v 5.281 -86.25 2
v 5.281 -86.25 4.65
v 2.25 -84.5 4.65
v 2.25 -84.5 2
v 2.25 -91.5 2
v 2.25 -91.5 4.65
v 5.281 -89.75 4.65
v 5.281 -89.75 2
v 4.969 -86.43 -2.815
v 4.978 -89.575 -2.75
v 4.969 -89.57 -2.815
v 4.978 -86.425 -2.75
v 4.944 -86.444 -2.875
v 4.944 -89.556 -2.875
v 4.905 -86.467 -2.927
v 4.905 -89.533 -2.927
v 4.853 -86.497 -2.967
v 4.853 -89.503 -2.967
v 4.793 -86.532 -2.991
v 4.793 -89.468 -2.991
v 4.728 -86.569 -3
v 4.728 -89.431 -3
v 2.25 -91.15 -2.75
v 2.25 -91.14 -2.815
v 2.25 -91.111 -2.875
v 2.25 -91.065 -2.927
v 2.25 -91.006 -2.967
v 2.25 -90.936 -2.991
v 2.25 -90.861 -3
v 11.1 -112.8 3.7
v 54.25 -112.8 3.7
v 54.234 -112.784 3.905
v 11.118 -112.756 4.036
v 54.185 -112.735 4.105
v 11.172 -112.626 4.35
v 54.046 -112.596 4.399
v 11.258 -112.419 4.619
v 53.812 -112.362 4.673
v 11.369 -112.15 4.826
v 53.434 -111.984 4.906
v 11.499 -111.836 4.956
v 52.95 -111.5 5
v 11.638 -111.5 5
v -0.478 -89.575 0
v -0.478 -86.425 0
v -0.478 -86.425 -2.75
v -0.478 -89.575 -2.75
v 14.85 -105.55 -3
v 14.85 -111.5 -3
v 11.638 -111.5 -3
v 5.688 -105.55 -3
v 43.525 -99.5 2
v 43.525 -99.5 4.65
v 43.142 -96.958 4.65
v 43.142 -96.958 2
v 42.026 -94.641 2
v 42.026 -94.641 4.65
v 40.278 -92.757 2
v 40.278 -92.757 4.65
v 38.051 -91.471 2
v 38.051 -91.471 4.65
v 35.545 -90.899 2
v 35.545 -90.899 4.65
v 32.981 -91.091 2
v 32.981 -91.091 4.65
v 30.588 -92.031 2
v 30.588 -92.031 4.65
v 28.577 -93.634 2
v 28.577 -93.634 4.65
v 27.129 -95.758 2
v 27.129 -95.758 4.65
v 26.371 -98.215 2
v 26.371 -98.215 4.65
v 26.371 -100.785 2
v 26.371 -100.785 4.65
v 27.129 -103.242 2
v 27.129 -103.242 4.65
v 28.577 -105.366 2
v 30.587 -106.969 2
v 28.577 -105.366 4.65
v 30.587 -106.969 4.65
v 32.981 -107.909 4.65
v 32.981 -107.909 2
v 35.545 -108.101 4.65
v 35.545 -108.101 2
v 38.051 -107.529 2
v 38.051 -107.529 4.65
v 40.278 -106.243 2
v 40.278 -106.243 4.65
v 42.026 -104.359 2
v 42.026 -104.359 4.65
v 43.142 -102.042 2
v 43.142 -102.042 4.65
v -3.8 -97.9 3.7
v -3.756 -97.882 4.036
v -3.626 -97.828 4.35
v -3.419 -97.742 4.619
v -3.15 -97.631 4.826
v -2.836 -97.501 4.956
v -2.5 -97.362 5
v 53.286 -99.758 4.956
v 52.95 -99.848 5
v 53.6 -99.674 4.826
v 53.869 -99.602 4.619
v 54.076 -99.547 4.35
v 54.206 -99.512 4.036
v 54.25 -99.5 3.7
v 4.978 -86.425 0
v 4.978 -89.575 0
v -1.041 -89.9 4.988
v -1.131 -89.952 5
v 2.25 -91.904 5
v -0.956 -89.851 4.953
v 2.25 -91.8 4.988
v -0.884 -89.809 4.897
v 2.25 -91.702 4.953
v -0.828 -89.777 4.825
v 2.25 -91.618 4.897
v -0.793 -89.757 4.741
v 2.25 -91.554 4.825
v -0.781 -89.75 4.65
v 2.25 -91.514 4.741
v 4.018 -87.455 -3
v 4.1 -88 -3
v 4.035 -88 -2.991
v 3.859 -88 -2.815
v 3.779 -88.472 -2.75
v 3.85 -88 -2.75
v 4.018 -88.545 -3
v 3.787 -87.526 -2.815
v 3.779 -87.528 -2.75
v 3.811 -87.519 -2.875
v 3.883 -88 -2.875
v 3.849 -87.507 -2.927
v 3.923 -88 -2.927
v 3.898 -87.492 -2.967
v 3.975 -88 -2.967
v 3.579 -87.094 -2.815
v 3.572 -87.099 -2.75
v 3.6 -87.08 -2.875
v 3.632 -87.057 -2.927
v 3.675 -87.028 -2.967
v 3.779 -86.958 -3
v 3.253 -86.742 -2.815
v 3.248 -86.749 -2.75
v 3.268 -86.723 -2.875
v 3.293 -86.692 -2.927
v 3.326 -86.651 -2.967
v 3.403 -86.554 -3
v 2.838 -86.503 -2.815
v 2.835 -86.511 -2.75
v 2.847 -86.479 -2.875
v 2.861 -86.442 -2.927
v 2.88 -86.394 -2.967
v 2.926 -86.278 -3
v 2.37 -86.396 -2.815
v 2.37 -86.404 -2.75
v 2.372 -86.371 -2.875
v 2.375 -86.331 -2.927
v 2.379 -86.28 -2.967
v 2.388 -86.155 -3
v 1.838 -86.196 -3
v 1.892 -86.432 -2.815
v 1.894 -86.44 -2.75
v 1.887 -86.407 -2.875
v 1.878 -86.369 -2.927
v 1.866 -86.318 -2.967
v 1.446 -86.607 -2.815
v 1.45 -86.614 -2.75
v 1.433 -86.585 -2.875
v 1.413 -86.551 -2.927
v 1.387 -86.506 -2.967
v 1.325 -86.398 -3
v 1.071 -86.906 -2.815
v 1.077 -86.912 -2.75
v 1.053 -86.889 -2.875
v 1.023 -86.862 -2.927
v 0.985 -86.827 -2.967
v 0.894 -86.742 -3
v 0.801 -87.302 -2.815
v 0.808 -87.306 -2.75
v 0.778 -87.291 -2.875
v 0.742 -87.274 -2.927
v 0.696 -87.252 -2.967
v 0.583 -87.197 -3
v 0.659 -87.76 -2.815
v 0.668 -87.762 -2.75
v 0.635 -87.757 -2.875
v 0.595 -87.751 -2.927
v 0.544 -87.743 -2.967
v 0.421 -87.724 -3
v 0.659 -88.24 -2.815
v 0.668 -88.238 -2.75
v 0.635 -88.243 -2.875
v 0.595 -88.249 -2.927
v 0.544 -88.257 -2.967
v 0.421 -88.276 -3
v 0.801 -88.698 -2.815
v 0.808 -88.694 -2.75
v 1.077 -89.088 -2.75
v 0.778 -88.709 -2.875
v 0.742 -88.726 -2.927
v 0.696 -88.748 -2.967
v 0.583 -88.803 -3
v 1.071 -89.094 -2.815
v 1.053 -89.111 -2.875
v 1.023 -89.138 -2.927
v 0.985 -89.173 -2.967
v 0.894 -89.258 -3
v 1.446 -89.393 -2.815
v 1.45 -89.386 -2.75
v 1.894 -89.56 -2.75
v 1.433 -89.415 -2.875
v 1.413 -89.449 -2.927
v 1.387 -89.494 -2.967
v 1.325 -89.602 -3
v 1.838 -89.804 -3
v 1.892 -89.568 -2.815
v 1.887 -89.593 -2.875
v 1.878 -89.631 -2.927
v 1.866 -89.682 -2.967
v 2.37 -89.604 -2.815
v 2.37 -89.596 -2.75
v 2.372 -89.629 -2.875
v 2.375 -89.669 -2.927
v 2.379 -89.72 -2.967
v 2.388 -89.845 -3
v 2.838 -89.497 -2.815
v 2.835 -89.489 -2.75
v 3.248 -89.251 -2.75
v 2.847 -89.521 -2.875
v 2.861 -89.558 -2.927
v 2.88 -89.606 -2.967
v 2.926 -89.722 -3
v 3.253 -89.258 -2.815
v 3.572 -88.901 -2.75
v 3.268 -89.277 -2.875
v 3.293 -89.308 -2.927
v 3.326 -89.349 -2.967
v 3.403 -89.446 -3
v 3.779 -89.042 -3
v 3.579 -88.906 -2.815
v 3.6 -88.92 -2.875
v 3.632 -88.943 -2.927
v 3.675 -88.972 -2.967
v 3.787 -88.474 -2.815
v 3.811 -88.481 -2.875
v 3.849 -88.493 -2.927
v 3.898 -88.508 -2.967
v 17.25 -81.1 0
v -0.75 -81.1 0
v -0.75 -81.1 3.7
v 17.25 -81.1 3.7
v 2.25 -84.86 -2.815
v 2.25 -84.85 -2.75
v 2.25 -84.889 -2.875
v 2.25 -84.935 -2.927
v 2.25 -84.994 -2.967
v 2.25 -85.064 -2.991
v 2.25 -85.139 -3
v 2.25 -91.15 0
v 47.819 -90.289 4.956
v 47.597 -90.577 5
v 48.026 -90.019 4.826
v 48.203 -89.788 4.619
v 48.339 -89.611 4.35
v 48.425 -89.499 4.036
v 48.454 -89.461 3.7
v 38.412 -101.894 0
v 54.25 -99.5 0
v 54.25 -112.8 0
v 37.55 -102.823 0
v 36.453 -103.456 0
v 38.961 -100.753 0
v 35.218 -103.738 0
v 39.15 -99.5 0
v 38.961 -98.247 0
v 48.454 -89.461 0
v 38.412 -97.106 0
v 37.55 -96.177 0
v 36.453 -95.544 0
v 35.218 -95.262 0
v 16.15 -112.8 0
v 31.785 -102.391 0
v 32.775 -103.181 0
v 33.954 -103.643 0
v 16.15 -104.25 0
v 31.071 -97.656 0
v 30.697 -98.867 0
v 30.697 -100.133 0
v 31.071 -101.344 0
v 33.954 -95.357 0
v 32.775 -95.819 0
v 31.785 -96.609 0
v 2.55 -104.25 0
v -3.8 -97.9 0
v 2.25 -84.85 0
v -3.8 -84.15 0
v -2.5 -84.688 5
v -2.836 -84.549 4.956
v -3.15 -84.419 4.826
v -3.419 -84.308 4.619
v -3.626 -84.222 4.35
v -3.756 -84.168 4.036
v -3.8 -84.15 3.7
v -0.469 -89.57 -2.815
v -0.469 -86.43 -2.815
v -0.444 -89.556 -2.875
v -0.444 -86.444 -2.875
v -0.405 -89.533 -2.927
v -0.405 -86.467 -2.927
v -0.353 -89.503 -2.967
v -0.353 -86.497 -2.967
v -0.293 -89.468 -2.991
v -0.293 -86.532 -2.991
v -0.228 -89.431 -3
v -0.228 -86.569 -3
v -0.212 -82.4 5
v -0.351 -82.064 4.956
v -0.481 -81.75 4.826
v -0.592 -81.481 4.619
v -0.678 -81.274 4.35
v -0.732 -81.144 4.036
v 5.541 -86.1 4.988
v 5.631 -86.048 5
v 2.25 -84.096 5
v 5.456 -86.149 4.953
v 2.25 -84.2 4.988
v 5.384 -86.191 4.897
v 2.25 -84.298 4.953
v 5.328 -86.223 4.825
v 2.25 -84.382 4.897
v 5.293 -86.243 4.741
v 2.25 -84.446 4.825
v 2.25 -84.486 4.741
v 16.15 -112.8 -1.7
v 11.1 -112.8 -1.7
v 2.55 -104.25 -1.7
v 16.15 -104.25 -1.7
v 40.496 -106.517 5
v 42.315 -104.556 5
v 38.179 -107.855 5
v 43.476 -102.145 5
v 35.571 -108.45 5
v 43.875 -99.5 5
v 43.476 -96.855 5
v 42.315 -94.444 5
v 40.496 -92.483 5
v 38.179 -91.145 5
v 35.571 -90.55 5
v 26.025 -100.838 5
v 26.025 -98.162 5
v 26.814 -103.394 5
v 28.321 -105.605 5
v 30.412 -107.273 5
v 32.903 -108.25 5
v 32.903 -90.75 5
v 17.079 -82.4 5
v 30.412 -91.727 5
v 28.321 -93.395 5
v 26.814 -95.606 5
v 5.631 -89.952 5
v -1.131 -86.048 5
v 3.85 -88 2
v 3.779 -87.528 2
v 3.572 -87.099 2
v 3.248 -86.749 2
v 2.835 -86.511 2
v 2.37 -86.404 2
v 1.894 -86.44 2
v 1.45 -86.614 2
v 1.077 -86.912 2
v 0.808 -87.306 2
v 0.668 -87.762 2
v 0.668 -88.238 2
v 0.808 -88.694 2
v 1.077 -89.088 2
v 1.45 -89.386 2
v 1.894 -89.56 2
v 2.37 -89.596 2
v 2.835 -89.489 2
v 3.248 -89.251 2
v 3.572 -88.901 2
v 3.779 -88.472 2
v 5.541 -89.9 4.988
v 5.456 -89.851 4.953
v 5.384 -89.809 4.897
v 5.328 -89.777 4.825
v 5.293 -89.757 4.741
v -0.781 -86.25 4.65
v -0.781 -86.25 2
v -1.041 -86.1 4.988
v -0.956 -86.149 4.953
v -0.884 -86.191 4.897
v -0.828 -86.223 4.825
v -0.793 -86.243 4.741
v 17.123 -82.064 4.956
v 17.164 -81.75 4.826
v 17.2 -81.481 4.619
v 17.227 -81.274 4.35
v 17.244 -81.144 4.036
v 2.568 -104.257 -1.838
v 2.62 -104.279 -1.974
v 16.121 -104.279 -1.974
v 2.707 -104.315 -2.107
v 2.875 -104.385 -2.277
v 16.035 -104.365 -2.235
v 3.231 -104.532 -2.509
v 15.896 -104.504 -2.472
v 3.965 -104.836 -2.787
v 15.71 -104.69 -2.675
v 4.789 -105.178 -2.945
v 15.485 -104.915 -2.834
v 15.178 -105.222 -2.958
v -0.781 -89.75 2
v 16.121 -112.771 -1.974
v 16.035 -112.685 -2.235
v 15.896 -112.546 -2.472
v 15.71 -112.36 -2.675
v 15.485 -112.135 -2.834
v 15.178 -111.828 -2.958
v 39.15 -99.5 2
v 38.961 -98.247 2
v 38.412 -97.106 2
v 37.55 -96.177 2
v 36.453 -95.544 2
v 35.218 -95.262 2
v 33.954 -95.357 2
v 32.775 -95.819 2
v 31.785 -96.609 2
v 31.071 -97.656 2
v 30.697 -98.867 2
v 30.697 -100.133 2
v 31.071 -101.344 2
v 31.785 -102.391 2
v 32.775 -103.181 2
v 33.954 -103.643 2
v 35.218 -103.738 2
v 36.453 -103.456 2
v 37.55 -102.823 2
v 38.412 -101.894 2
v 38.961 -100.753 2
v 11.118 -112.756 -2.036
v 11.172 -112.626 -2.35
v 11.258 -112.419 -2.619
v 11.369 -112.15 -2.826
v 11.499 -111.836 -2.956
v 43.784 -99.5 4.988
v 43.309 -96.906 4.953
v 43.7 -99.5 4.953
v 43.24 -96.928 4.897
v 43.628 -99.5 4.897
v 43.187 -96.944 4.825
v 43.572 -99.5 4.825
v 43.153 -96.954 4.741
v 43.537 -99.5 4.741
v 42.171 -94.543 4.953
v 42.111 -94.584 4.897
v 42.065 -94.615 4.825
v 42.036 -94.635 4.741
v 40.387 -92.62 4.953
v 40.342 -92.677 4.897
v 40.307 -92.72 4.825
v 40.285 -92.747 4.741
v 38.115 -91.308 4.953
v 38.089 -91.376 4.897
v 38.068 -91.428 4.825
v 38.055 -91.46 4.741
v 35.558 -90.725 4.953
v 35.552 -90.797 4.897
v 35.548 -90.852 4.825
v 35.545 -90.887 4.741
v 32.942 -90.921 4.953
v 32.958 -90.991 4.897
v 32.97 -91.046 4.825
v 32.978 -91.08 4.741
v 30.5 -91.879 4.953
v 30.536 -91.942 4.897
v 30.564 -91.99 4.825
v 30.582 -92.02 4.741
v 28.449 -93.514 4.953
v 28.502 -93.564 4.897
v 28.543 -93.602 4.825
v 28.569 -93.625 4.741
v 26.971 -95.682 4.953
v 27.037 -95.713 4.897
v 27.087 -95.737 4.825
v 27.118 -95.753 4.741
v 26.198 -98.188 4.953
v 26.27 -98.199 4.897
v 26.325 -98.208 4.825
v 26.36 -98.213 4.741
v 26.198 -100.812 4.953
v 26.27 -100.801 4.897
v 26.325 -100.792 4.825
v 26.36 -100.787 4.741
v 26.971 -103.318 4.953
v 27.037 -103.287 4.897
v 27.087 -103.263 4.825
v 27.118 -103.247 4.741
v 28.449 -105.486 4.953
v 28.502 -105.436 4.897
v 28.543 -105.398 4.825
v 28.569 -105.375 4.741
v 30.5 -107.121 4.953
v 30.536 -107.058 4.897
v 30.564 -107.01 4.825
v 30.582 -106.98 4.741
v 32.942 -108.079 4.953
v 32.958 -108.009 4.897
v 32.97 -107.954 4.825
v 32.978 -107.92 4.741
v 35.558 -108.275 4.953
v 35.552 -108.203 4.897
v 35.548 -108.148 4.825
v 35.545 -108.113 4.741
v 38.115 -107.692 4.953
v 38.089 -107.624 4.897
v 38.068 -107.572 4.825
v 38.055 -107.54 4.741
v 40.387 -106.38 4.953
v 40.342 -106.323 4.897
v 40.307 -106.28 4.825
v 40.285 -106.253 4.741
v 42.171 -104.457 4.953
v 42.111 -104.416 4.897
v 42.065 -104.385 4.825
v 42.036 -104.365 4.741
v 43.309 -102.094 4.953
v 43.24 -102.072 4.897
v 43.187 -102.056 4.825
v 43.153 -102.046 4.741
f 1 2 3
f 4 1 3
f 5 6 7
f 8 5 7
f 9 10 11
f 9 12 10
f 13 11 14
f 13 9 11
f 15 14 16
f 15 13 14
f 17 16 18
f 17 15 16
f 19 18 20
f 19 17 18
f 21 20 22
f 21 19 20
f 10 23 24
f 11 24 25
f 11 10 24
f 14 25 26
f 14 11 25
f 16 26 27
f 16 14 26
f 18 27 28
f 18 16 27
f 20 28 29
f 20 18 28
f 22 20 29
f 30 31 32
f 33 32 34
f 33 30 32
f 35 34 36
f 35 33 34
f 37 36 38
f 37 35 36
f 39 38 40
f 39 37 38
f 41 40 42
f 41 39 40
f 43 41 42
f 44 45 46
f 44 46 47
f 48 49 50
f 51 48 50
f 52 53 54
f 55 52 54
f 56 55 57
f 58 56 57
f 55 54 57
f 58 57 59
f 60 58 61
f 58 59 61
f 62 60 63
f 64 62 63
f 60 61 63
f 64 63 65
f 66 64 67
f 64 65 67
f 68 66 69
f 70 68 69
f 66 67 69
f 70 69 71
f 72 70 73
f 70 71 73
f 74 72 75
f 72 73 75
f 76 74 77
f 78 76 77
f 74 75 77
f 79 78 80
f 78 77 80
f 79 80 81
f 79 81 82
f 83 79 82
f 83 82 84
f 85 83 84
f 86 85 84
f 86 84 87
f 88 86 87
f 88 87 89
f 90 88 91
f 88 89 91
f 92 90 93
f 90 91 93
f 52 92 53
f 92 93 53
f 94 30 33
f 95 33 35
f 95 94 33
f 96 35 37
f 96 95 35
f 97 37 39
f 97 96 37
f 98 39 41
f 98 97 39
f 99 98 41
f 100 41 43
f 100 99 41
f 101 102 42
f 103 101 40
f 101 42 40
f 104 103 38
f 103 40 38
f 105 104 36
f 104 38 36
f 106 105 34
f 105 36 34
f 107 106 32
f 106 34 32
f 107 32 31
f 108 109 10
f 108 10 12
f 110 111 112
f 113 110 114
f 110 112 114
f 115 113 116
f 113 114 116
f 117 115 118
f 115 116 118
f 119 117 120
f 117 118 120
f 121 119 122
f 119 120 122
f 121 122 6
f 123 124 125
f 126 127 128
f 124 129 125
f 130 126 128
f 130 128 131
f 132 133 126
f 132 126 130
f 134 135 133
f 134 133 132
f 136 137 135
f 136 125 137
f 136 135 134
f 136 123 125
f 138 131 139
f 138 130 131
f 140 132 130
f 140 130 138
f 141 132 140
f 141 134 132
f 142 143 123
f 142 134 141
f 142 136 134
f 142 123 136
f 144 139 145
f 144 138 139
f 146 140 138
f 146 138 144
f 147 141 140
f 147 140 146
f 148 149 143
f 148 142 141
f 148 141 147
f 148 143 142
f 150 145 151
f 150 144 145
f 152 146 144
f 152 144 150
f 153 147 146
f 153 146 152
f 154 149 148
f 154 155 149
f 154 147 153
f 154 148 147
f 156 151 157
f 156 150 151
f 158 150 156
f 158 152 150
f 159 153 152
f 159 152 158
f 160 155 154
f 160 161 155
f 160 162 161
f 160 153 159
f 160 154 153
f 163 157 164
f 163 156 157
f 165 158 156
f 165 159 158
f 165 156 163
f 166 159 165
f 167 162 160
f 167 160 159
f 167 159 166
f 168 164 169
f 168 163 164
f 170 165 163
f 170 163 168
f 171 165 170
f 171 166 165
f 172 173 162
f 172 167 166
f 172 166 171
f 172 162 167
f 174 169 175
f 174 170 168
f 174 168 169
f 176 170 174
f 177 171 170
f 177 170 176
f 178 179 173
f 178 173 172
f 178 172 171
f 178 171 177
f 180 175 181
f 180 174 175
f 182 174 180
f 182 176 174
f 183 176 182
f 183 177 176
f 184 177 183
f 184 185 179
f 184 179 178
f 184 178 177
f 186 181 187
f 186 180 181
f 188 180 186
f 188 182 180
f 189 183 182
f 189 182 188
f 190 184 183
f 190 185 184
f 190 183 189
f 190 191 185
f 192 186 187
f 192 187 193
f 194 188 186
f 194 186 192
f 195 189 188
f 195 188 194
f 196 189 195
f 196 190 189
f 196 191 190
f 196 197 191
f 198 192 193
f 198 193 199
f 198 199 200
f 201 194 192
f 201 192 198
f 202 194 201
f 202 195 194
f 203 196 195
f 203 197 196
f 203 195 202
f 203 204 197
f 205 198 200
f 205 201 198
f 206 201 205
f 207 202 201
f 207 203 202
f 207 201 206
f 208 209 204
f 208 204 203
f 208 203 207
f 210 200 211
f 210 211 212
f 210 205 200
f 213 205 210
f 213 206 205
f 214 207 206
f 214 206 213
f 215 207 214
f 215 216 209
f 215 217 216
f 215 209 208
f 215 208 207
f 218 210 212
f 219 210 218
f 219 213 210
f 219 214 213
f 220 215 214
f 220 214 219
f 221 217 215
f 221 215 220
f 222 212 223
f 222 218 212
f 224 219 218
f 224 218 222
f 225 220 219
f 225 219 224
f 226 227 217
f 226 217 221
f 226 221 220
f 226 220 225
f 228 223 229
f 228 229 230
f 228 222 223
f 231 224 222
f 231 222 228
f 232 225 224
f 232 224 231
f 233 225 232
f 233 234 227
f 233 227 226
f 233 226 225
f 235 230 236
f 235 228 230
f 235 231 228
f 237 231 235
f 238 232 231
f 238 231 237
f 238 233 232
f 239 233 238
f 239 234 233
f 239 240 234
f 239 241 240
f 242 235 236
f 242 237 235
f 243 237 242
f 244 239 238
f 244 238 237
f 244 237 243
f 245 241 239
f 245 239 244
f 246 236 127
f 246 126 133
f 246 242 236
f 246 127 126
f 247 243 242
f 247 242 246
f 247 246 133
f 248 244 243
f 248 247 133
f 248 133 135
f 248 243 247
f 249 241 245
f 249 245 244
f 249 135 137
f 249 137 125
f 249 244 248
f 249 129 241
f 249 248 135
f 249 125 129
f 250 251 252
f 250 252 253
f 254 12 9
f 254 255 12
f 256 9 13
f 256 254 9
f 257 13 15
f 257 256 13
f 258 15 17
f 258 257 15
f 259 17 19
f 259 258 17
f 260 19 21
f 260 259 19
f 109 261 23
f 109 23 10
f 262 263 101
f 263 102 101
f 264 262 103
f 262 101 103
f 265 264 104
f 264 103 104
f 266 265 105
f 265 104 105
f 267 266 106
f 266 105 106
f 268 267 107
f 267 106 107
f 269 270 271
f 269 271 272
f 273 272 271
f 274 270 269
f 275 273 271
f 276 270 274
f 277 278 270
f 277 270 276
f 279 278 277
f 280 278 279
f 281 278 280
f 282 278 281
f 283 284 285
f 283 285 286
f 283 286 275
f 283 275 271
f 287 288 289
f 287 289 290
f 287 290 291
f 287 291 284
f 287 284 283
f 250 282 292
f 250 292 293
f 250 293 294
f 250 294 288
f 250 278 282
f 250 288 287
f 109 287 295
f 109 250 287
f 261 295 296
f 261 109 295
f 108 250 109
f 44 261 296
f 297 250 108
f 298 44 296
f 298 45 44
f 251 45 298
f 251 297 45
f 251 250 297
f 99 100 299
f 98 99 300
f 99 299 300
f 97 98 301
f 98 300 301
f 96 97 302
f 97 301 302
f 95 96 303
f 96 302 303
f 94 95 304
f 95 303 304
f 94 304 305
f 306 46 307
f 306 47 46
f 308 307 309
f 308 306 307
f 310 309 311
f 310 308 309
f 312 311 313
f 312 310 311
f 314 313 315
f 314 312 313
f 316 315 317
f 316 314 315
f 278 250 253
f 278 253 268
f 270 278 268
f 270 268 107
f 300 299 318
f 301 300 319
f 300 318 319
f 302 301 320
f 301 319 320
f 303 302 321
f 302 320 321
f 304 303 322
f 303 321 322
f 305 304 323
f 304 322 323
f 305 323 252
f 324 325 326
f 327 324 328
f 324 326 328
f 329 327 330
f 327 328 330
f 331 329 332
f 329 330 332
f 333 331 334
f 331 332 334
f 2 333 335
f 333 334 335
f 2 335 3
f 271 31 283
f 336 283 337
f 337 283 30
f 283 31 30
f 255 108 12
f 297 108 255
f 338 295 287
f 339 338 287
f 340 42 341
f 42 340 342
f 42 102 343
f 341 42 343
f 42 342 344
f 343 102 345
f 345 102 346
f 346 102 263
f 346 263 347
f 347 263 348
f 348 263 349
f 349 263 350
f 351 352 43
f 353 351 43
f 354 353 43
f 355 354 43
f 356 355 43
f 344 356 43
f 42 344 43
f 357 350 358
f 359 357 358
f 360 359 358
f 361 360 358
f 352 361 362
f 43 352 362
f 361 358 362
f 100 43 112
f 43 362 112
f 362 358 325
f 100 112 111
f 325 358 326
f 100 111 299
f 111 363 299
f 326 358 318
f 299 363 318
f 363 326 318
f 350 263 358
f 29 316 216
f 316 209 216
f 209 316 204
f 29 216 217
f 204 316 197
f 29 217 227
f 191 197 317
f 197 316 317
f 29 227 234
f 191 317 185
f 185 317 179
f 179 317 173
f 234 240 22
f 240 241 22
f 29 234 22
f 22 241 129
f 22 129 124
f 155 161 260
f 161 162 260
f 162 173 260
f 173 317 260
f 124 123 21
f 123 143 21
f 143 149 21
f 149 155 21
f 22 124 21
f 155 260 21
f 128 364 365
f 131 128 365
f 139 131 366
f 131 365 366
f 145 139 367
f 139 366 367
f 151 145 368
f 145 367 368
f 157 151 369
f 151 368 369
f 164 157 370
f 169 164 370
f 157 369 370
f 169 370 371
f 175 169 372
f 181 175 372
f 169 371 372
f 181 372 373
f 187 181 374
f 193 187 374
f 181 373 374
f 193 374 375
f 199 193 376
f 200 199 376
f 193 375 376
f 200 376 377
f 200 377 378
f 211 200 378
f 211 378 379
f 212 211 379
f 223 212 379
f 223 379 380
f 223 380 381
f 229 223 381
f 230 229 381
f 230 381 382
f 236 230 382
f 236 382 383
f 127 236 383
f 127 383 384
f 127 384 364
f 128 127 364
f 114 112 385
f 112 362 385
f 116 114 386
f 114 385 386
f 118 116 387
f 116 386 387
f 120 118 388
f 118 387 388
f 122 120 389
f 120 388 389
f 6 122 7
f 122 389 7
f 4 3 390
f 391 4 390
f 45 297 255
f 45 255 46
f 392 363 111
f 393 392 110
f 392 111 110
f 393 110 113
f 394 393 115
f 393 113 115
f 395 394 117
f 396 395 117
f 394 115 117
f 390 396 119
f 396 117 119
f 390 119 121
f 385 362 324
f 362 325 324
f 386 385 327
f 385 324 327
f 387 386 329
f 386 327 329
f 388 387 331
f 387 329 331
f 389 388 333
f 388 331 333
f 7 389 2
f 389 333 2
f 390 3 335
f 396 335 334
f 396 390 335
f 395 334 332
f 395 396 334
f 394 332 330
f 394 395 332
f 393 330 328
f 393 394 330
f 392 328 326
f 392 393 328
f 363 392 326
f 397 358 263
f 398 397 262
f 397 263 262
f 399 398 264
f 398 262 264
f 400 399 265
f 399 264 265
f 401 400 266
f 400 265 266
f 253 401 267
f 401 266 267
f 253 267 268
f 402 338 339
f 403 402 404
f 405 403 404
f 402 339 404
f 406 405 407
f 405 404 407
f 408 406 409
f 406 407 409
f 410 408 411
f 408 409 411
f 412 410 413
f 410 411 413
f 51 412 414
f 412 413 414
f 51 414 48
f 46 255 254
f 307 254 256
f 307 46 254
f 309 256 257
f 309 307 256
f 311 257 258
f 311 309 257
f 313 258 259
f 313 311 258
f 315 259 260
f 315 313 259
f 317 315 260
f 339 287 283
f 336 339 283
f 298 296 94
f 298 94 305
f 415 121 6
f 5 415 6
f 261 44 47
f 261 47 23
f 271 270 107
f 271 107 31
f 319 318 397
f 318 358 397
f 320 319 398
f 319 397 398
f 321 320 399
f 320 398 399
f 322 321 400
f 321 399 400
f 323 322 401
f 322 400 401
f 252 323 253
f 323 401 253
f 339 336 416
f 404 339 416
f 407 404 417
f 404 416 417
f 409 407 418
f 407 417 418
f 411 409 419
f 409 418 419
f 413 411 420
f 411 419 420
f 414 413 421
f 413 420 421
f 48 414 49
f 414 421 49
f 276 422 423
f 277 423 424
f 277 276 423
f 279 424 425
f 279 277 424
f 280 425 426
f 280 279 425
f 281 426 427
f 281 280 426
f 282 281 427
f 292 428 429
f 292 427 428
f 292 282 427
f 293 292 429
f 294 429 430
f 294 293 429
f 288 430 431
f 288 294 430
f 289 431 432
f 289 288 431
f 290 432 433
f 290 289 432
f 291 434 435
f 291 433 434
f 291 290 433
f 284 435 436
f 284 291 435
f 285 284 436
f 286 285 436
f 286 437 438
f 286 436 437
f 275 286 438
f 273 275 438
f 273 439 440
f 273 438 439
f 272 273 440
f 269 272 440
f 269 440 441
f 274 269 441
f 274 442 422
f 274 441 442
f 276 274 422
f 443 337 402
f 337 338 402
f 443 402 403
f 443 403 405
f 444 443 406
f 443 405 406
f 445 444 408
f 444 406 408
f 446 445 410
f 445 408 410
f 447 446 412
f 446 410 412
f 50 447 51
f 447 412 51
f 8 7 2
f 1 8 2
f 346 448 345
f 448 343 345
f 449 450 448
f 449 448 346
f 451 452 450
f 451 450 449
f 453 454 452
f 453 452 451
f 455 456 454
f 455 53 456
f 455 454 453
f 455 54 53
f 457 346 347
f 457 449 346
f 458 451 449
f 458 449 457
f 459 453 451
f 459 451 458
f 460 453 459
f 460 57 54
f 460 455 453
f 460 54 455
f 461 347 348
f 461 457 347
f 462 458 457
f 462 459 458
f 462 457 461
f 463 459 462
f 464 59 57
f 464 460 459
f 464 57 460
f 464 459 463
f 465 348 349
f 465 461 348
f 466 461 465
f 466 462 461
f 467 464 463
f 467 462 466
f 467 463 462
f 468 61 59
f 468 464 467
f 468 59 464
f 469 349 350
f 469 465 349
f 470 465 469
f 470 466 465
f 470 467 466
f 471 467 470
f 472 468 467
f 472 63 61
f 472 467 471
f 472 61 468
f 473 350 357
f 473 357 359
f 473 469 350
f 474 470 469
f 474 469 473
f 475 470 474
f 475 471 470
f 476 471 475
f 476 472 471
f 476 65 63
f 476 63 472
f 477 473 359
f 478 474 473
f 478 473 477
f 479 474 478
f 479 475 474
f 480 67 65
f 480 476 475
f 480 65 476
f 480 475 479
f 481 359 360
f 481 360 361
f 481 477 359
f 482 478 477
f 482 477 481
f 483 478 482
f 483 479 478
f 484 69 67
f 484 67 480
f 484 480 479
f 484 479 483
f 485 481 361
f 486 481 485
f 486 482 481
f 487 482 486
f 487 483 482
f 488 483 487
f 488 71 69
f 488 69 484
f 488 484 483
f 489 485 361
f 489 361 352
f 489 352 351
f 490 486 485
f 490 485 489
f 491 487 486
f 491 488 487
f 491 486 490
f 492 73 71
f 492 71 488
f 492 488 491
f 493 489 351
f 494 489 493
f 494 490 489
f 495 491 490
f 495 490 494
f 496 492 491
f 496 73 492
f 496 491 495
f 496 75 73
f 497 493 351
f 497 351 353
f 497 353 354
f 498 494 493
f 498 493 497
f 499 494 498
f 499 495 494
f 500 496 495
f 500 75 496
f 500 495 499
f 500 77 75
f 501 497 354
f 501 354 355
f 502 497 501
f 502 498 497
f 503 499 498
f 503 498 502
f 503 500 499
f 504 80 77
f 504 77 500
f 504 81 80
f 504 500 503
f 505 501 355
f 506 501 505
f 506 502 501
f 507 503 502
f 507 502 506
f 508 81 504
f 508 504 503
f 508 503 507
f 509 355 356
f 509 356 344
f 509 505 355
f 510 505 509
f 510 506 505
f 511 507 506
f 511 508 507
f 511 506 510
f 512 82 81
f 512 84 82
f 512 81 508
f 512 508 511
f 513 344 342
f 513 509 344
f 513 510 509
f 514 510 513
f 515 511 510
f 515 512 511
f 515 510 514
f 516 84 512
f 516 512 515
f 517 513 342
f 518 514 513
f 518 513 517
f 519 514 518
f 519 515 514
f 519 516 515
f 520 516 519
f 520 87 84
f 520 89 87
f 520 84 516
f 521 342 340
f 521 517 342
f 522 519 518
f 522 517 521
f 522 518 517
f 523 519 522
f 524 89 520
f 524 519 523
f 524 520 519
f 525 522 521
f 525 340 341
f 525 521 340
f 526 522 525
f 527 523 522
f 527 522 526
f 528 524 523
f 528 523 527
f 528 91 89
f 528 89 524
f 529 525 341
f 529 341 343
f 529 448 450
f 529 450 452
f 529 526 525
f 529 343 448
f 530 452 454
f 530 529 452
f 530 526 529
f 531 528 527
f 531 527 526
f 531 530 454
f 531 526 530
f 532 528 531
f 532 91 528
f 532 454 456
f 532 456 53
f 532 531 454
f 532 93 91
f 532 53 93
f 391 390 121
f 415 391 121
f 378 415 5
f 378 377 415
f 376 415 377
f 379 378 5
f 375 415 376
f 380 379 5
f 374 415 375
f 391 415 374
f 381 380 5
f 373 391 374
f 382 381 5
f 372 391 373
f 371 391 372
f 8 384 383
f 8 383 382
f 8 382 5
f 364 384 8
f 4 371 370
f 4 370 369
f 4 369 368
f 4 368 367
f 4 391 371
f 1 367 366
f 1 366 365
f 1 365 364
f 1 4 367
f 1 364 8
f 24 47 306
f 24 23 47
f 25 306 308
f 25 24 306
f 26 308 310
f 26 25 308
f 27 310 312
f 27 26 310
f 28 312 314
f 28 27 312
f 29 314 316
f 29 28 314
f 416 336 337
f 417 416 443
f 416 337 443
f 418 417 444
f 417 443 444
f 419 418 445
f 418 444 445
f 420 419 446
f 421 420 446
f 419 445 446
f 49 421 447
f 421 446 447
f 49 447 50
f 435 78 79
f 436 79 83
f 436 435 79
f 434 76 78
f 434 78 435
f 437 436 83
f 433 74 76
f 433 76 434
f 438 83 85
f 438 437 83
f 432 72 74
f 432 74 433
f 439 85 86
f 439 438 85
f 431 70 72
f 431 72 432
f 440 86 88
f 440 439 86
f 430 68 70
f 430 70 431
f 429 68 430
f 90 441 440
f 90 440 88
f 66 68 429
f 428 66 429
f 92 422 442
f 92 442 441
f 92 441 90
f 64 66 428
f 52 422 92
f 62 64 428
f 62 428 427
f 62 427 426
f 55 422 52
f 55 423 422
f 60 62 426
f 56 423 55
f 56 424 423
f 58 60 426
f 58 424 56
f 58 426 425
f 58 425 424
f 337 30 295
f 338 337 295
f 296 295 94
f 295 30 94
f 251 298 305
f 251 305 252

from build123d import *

# Parameters (mm, degrees)
SKETCH019_R     = 4.25
PAD010_DEPTH    = 5
PAD009_DEPTH    = 3
SKETCH021_R     = 8.625
POCKET008_DEPTH = 3
POCKET009_DEPTH = 3
SKETCH018_R     = 1.6
POCKET007_DEPTH = 8.001
SKETCH022_R     = 1.6
PAD011_DEPTH    = 3
FILLET020_R     = 0.35
FILLET021_R     = 0.35
FILLET022_R     = 0.25
FILLET023_R     = 1.3
FILLET024_R     = 1.3


with BuildPart() as part:
    # Sketch019 → Pad010 (new body)
    with BuildSketch(Plane.XY):
        Polygon((-3, 6.9), (15, 6.9), (46.204036, -1.461096), (52, -11.5), (52, -24.8), (8.85, -24.8), (-6.05, -9.9), (-6.05, 3.85), align=None)
        with Locations((32.65, -11.5)):
            Circle(SKETCH019_R, mode=Mode.SUBTRACT)
    extrude(amount=PAD010_DEPTH)

    # Sketch020 → Pad009 (join)
    with BuildSketch(Plane.XY):
        Polygon((0.3, -16.25), (13.9, -16.25), (13.9, -24.8), (8.85, -24.8), align=None)
    extrude(amount=-PAD009_DEPTH)

    # Sketch021 → Pocket008 (cut)
    with BuildSketch(Plane.XY.offset(5)):
        with Locations((32.65, -11.5)):
            Circle(SKETCH021_R)
    extrude(amount=-POCKET008_DEPTH, mode=Mode.SUBTRACT)

    # Sketch017 → Pocket009 (cut)
    with BuildSketch(Plane.XY.offset(5)):
        Polygon((0, -3.5), (3.031089, -1.75), (3.031089, 1.75), (0, 3.5), (-3.031089, 1.75), (-3.031089, -1.75), align=None)
    extrude(amount=-POCKET009_DEPTH, mode=Mode.SUBTRACT)

    # Sketch018 → Pocket007 (cut, through all)
    with BuildSketch(Plane.XY.offset(-3)):
        Circle(SKETCH018_R)
    extrude(amount=POCKET007_DEPTH, mode=Mode.SUBTRACT)

    # Sketch022 → Pad011 (join)
    with BuildSketch(Plane.XY):
        Polygon((0, -3.15), (2.72798, -1.575), (2.72798, 1.575), (0, 3.15), (-2.72798, 1.575), (-2.72798, -1.575), align=None)
        Circle(SKETCH022_R, mode=Mode.SUBTRACT)
    extrude(amount=-PAD011_DEPTH)

    # Fillet020
    fillet020_edges = [part.edges().sort_by_distance(p)[0] for p in [
        (-1.515544, -2.625, 5),
        (-3.031089, 0, 5),
        (-1.515544, 2.625, 5),
        (1.515544, 2.625, 5),
        (3.031089, 0, 5),
        (1.515544, -2.625, 5),
    ]]
    fillet(fillet020_edges, radius=FILLET020_R)

    # Fillet021
    fillet021_edges = [part.edges().sort_by_distance(p)[0] for p in [
        (24.025, -11.5, 5),
    ]]
    fillet(fillet021_edges, radius=FILLET021_R)

    # Fillet022
    fillet022_edges = [part.edges().sort_by_distance(p)[0] for p in [
        (1.36399, -2.3625, -3),
        (2.72798, 0, -3),
        (1.36399, 2.3625, -3),
        (-1.36399, 2.3625, -3),
        (-2.72798, 0, -3),
        (-1.36399, -2.3625, -3),
        (-1.6, 0, -3),
    ]]
    fillet(fillet022_edges, radius=FILLET022_R)

    # Fillet023
    fillet023_edges = [part.edges().sort_by_distance(p)[0] for p in [
        (7.1, -16.25, -3),
        (13.9, -20.525, -3),
        (11.375, -24.8, -3),
        (4.575, -20.525, -3),
    ]]
    fillet(fillet023_edges, radius=FILLET023_R)

    # Fillet024
    fillet024_edges = [part.edges().sort_by_distance(p)[0] for p in [
        (52, -18.15, 5),
        (30.425, -24.8, 5),
        (1.4, -17.35, 5),
        (-6.05, -3.025, 5),
        (-4.525, 5.375, 5),
        (6, 6.9, 5),
        (30.602018, 2.719452, 5),
        (49.102018, -6.480548, 5),
    ]]
    fillet(fillet024_edges, radius=FILLET024_R)


with BuildPart() as part_1:
    # Body003 placement: moved
    add(part.part.moved(Location((2.25, -88, 0))))


solid = part_1.part
